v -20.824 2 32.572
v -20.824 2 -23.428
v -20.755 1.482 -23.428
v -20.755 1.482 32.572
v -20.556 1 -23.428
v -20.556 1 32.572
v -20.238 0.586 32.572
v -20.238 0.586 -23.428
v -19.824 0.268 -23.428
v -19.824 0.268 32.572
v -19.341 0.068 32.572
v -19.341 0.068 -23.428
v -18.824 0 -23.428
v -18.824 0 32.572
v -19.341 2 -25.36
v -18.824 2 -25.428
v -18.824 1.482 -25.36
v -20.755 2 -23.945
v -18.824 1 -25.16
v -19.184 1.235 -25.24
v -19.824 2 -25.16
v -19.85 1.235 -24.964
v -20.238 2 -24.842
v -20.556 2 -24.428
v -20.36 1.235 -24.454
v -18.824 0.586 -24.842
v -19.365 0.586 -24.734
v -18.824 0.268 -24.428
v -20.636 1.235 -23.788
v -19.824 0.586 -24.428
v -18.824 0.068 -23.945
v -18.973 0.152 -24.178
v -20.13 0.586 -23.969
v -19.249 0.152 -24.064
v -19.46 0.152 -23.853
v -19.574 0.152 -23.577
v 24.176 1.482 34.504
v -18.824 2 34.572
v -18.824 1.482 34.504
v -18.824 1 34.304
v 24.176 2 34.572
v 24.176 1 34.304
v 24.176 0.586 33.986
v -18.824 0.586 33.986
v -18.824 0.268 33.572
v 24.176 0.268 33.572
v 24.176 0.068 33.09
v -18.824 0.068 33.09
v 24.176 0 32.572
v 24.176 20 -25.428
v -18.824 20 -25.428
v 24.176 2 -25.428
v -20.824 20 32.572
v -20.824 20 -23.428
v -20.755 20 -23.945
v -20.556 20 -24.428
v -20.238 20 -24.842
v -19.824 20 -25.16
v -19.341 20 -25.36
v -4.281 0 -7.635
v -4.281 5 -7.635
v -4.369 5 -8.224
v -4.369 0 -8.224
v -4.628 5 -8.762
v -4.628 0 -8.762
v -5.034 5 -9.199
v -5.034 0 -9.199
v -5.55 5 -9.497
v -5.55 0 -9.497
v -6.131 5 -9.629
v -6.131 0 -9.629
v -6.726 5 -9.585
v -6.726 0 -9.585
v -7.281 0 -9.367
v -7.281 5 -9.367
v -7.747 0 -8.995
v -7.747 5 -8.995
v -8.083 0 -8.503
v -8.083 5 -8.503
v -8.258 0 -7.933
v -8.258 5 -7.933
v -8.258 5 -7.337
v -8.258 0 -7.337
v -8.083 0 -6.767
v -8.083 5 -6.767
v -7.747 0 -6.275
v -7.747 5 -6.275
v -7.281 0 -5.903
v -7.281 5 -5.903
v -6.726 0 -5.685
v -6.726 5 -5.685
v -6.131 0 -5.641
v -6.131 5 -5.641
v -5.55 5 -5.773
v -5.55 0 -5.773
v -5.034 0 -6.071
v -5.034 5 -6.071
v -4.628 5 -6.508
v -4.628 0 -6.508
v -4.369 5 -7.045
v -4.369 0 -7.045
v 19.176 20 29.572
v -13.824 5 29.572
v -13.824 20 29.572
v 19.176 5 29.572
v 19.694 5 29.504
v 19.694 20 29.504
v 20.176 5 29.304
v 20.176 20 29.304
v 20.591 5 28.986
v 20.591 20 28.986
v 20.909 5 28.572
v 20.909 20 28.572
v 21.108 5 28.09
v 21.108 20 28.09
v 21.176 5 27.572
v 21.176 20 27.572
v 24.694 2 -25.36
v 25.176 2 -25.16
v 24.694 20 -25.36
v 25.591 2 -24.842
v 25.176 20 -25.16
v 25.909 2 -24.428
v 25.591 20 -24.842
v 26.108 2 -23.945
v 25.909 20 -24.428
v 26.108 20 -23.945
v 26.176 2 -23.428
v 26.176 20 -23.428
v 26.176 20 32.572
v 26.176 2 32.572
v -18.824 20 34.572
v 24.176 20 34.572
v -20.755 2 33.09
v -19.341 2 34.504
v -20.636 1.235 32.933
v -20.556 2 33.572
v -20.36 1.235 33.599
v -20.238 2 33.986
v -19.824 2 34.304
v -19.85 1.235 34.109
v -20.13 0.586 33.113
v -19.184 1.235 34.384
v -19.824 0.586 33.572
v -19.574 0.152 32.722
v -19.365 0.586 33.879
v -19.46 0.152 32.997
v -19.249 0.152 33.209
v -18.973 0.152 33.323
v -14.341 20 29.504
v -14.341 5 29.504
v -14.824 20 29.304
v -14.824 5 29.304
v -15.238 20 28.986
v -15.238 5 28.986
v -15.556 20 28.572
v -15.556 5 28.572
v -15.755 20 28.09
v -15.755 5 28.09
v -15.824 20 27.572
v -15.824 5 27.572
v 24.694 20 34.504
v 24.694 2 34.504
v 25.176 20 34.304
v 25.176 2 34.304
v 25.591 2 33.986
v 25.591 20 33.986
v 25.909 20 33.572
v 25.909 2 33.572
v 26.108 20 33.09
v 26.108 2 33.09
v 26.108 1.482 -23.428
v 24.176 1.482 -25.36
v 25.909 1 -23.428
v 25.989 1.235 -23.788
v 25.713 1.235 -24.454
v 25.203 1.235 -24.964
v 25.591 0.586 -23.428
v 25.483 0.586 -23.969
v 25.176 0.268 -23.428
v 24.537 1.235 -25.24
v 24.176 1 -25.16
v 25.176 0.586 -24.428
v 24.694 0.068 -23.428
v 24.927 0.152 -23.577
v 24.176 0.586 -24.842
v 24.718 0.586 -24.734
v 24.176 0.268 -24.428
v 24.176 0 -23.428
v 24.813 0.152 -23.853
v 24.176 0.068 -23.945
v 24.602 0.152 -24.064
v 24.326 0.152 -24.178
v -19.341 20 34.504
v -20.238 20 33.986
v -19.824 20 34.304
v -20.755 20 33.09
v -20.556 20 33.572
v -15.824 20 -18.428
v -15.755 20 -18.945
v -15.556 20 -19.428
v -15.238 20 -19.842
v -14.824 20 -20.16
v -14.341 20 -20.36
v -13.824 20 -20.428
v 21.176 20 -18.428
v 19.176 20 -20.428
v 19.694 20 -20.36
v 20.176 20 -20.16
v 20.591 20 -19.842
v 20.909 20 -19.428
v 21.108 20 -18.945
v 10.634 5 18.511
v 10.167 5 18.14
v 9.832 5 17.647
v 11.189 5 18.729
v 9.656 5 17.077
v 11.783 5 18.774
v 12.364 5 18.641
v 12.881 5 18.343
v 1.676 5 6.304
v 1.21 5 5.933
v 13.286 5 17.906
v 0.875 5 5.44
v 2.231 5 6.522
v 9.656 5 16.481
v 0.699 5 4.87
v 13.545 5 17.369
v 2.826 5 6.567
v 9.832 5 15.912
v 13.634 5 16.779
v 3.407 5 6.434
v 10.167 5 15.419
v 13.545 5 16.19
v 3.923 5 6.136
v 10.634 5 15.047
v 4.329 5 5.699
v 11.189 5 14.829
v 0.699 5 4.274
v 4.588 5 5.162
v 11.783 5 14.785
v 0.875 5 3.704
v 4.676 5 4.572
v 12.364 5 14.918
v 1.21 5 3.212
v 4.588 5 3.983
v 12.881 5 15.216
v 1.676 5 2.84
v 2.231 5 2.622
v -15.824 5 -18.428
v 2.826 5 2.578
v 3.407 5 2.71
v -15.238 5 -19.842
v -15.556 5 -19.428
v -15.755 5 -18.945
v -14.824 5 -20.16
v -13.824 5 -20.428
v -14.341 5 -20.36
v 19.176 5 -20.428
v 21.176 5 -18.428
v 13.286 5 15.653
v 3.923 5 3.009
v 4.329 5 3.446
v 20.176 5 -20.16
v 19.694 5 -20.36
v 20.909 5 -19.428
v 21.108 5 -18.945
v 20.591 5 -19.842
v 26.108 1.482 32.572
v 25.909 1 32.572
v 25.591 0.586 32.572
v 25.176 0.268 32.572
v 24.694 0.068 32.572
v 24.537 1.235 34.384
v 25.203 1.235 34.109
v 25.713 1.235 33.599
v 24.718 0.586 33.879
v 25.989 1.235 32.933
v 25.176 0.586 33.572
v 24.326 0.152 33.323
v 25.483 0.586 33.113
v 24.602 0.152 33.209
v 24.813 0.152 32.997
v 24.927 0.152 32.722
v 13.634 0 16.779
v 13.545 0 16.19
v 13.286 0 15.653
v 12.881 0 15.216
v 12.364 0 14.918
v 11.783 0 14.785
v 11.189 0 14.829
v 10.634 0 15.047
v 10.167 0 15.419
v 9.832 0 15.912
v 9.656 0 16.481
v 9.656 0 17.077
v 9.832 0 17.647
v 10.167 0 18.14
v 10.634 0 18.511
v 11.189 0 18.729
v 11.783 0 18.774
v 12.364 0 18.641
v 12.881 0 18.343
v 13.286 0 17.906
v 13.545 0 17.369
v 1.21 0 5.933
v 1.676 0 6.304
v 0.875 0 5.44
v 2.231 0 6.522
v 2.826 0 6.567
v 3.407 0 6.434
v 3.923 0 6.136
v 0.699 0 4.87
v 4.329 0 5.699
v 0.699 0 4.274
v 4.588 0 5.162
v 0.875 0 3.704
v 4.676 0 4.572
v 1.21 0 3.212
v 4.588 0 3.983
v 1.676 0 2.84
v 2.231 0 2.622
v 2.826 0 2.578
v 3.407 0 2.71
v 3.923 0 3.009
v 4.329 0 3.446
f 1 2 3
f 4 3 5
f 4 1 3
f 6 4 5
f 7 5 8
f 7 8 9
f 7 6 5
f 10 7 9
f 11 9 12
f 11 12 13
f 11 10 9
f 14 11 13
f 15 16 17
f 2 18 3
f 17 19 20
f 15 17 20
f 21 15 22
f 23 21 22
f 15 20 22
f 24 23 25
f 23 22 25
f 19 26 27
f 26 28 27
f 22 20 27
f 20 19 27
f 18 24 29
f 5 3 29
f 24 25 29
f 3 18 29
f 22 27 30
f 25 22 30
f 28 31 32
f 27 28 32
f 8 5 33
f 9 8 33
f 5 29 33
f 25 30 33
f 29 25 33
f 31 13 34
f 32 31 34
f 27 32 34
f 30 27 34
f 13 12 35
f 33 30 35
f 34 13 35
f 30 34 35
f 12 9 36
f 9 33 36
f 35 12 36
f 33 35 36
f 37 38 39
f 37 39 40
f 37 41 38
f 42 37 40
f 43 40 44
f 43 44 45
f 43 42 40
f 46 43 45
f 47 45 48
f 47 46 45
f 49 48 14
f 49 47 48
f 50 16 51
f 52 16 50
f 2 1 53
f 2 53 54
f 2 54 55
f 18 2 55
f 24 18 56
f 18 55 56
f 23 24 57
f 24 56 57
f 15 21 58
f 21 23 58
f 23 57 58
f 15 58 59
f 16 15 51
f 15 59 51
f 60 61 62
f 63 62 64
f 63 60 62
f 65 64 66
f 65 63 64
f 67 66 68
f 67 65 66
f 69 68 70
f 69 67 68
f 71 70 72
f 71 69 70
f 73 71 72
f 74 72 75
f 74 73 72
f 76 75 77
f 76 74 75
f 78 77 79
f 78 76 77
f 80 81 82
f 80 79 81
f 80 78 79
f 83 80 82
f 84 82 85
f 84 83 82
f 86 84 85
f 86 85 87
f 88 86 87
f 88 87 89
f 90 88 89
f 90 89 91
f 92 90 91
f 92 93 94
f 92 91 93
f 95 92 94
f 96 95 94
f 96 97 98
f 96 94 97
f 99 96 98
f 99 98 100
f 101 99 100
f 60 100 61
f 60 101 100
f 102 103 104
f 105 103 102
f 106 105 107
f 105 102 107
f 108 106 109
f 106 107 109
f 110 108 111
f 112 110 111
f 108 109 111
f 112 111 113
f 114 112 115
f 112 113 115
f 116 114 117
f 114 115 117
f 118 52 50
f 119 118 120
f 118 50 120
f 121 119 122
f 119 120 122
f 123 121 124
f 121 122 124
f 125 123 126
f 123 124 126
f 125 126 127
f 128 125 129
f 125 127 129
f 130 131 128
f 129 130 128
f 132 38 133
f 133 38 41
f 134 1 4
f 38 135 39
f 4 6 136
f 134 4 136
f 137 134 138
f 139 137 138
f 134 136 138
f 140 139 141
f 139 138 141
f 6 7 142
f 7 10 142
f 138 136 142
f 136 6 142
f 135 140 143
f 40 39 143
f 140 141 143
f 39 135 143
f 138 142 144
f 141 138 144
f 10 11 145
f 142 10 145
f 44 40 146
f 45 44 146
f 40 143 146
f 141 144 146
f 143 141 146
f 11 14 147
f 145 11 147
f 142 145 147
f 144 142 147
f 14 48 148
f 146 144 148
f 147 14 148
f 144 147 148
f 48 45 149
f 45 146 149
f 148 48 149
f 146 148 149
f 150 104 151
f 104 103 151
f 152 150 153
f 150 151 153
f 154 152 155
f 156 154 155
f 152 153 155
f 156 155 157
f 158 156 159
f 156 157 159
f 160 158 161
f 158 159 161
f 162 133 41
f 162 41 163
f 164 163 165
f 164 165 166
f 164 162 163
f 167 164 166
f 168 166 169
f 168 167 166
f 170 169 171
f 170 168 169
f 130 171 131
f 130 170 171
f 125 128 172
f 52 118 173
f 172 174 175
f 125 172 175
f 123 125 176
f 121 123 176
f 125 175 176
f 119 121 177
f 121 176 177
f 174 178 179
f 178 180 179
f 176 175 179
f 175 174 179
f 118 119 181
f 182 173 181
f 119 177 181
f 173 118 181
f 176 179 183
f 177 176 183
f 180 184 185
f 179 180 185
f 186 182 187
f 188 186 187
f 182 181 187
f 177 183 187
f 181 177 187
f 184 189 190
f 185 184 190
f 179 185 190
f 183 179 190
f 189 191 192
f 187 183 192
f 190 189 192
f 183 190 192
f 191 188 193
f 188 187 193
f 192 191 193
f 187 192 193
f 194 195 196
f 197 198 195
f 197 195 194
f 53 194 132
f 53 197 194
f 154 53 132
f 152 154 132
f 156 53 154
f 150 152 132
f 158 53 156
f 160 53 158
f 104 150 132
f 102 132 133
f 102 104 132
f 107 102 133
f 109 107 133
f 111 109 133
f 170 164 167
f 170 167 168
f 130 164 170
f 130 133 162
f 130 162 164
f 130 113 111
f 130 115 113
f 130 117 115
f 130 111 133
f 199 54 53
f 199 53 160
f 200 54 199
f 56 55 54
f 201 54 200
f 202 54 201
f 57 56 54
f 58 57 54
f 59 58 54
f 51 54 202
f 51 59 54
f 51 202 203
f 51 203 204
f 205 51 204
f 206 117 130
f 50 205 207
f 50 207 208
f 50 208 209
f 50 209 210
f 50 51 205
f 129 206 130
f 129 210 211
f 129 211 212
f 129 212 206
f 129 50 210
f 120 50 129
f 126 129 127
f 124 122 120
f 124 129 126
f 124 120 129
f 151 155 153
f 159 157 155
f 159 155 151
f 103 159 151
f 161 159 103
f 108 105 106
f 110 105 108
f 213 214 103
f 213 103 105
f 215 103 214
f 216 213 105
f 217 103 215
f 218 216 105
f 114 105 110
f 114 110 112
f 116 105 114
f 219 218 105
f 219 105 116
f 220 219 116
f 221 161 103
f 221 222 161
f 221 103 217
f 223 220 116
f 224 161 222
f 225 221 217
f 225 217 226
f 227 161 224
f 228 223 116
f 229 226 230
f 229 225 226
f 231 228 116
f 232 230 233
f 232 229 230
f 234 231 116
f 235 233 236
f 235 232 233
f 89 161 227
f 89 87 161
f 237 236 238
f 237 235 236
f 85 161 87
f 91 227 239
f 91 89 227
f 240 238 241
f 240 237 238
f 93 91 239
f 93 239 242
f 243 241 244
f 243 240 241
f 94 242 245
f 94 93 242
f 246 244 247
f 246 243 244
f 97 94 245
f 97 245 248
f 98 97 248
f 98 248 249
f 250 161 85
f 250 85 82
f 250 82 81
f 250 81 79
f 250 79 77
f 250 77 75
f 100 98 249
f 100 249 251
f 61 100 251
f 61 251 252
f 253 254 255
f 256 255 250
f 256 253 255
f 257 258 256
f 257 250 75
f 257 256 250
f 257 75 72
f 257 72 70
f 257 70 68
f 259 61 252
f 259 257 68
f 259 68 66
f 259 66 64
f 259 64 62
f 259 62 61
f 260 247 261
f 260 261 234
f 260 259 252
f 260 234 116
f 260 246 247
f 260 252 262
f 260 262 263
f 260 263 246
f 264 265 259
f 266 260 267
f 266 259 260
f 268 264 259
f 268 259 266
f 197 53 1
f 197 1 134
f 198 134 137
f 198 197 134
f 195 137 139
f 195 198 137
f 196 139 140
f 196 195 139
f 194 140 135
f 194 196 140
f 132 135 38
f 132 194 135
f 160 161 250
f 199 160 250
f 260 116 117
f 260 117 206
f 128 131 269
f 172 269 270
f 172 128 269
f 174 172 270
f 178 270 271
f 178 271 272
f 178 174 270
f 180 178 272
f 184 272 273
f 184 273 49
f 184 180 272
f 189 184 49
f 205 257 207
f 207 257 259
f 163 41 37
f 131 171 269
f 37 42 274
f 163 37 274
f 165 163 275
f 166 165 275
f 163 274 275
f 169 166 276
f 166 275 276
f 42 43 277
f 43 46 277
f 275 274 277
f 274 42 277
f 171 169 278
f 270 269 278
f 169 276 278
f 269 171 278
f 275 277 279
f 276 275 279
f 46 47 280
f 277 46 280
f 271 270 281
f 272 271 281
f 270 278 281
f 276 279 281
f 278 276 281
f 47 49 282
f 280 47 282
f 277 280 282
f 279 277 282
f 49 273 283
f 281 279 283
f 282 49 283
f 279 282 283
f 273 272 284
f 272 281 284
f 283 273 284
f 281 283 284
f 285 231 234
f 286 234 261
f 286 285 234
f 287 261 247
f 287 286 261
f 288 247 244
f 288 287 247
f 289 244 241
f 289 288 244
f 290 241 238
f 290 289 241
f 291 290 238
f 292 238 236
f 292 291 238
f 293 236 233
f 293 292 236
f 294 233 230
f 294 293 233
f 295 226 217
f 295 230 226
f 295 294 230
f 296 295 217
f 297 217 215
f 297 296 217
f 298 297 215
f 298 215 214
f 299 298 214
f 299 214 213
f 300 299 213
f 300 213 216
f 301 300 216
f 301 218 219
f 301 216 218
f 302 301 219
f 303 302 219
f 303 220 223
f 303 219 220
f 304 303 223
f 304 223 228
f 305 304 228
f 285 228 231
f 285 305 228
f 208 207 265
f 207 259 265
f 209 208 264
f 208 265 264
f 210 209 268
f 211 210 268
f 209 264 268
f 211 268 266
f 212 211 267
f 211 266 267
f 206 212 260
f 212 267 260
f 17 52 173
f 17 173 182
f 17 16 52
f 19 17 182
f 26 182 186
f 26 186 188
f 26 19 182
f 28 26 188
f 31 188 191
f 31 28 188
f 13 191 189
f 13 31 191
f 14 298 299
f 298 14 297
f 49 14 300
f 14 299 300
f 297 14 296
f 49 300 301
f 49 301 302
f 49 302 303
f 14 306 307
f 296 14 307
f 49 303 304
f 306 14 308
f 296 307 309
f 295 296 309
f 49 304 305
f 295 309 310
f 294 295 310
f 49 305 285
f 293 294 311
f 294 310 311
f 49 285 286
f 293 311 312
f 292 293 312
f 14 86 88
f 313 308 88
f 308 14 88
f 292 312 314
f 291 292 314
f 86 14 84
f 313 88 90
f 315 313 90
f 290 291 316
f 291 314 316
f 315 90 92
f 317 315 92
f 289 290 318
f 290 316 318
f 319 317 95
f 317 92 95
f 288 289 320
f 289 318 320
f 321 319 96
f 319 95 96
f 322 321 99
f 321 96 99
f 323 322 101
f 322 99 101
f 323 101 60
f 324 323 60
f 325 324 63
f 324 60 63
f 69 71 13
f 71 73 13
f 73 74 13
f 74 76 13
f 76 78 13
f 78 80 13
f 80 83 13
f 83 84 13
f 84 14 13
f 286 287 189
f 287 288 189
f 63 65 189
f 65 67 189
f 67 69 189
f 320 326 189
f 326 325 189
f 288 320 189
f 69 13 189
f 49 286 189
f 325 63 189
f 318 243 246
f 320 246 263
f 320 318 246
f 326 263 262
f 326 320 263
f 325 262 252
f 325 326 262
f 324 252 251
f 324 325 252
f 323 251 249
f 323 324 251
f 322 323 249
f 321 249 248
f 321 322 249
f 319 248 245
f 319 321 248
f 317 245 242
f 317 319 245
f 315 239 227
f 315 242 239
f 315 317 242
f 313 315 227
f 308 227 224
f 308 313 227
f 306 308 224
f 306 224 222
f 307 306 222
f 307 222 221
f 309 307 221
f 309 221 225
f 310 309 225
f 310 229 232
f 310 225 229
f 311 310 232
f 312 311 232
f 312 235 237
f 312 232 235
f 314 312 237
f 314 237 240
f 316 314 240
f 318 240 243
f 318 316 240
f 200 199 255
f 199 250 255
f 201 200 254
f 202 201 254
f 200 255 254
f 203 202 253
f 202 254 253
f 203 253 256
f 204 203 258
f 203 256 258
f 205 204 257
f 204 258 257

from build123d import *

# Parameters (mm, degrees)
SKETCH1_W           = 47
SKETCH1_H           = 60
BOSS_EXTRUDE1_DEPTH = 20
SHELL1_T            = -5
FILLET2_R           = 2
FILLET3_R           = 2
FILLET4_R           = 2
FILLET5_R           = 2
FILLET6_R           = 2
FILLET7_R           = 2
FILLET8_R           = 2
FILLET9_R           = 2
FILLET10_R          = 2
SKETCH2_R           = 2
CUT_EXTRUDE1_DEPTH  = 10


with BuildPart() as part:
    # Sketch1 → Boss-Extrude1 (new body)
    with BuildSketch(Plane(origin=(0, 0, 0), x_dir=(1, 0, 0), z_dir=(0, 1, 0))):
        with Locations((2.676470588, -4.572192513)):
            Rectangle(SKETCH1_W, SKETCH1_H)
    extrude(amount=BOSS_EXTRUDE1_DEPTH)

    # Shell1
    shell1_openings = [part.faces().sort_by_distance(p)[0] for p in [
        (2.676470588, 20, 4.572192513),
    ]]
    offset(amount=SHELL1_T, openings=shell1_openings, kind=Kind.INTERSECTION)

    # Fillet2
    fillet2_edges = [part.edges().sort_by_distance(p)[0] for p in [
        (21.176470588, 12.5, 29.572192513),
    ]]
    fillet(fillet2_edges, radius=FILLET2_R)

    # Fillet3
    fillet3_edges = [part.edges().sort_by_distance(p)[0] for p in [
        (-15.823529412, 12.5, 29.572192513),
    ]]
    fillet(fillet3_edges, radius=FILLET3_R)

    # Fillet4
    fillet4_edges = [part.edges().sort_by_distance(p)[0] for p in [
        (-15.823529412, 12.5, -20.427807487),
    ]]
    fillet(fillet4_edges, radius=FILLET4_R)

    # Fillet5
    fillet5_edges = [part.edges().sort_by_distance(p)[0] for p in [
        (21.176470588, 12.5, -20.427807487),
    ]]
    fillet(fillet5_edges, radius=FILLET5_R)

    # Fillet6
    fillet6_edges = [part.edges().sort_by_distance(p)[0] for p in [
        (-20.823529412, 10, 34.572192513),
    ]]
    fillet(fillet6_edges, radius=FILLET6_R)

    # Fillet7
    fillet7_edges = [part.edges().sort_by_distance(p)[0] for p in [
        (26.176470588, 10, 34.572192513),
    ]]
    fillet(fillet7_edges, radius=FILLET7_R)

    # Fillet8
    fillet8_edges = [part.edges().sort_by_distance(p)[0] for p in [
        (-20.823529412, 10, -25.427807487),
    ]]
    fillet(fillet8_edges, radius=FILLET8_R)

    # Fillet9
    fillet9_edges = [part.edges().sort_by_distance(p)[0] for p in [
        (26.176470588, 10, -25.427807487),
    ]]
    fillet(fillet9_edges, radius=FILLET9_R)

    # Fillet10
    fillet10_edges = [part.edges().sort_by_distance(p)[0] for p in [
        (2.676470588, 0, 34.572192513),
        (26.176470588, 0, 4.572192513),
        (-20.823529412, 0, 4.572192513),
        (2.676470588, 0, -25.427807487),
    ]]
    fillet(fillet10_edges, radius=FILLET10_R)

    # Sketch2 → Cut-Extrude1 (cut)
    with BuildSketch(Plane(origin=(0, 0, 0), x_dir=(1, 0, 0), z_dir=(0, 1, 0))):
        with Locations((-6.280636193, 7.634914268)):
            Circle(SKETCH2_R)
        with Locations((2.676470588, -4.572192513)):
            Circle(SKETCH2_R)
        with Locations((11.633577369, -16.779299295)):
            Circle(SKETCH2_R)
    extrude(amount=CUT_EXTRUDE1_DEPTH, mode=Mode.SUBTRACT)


solid = part.part
